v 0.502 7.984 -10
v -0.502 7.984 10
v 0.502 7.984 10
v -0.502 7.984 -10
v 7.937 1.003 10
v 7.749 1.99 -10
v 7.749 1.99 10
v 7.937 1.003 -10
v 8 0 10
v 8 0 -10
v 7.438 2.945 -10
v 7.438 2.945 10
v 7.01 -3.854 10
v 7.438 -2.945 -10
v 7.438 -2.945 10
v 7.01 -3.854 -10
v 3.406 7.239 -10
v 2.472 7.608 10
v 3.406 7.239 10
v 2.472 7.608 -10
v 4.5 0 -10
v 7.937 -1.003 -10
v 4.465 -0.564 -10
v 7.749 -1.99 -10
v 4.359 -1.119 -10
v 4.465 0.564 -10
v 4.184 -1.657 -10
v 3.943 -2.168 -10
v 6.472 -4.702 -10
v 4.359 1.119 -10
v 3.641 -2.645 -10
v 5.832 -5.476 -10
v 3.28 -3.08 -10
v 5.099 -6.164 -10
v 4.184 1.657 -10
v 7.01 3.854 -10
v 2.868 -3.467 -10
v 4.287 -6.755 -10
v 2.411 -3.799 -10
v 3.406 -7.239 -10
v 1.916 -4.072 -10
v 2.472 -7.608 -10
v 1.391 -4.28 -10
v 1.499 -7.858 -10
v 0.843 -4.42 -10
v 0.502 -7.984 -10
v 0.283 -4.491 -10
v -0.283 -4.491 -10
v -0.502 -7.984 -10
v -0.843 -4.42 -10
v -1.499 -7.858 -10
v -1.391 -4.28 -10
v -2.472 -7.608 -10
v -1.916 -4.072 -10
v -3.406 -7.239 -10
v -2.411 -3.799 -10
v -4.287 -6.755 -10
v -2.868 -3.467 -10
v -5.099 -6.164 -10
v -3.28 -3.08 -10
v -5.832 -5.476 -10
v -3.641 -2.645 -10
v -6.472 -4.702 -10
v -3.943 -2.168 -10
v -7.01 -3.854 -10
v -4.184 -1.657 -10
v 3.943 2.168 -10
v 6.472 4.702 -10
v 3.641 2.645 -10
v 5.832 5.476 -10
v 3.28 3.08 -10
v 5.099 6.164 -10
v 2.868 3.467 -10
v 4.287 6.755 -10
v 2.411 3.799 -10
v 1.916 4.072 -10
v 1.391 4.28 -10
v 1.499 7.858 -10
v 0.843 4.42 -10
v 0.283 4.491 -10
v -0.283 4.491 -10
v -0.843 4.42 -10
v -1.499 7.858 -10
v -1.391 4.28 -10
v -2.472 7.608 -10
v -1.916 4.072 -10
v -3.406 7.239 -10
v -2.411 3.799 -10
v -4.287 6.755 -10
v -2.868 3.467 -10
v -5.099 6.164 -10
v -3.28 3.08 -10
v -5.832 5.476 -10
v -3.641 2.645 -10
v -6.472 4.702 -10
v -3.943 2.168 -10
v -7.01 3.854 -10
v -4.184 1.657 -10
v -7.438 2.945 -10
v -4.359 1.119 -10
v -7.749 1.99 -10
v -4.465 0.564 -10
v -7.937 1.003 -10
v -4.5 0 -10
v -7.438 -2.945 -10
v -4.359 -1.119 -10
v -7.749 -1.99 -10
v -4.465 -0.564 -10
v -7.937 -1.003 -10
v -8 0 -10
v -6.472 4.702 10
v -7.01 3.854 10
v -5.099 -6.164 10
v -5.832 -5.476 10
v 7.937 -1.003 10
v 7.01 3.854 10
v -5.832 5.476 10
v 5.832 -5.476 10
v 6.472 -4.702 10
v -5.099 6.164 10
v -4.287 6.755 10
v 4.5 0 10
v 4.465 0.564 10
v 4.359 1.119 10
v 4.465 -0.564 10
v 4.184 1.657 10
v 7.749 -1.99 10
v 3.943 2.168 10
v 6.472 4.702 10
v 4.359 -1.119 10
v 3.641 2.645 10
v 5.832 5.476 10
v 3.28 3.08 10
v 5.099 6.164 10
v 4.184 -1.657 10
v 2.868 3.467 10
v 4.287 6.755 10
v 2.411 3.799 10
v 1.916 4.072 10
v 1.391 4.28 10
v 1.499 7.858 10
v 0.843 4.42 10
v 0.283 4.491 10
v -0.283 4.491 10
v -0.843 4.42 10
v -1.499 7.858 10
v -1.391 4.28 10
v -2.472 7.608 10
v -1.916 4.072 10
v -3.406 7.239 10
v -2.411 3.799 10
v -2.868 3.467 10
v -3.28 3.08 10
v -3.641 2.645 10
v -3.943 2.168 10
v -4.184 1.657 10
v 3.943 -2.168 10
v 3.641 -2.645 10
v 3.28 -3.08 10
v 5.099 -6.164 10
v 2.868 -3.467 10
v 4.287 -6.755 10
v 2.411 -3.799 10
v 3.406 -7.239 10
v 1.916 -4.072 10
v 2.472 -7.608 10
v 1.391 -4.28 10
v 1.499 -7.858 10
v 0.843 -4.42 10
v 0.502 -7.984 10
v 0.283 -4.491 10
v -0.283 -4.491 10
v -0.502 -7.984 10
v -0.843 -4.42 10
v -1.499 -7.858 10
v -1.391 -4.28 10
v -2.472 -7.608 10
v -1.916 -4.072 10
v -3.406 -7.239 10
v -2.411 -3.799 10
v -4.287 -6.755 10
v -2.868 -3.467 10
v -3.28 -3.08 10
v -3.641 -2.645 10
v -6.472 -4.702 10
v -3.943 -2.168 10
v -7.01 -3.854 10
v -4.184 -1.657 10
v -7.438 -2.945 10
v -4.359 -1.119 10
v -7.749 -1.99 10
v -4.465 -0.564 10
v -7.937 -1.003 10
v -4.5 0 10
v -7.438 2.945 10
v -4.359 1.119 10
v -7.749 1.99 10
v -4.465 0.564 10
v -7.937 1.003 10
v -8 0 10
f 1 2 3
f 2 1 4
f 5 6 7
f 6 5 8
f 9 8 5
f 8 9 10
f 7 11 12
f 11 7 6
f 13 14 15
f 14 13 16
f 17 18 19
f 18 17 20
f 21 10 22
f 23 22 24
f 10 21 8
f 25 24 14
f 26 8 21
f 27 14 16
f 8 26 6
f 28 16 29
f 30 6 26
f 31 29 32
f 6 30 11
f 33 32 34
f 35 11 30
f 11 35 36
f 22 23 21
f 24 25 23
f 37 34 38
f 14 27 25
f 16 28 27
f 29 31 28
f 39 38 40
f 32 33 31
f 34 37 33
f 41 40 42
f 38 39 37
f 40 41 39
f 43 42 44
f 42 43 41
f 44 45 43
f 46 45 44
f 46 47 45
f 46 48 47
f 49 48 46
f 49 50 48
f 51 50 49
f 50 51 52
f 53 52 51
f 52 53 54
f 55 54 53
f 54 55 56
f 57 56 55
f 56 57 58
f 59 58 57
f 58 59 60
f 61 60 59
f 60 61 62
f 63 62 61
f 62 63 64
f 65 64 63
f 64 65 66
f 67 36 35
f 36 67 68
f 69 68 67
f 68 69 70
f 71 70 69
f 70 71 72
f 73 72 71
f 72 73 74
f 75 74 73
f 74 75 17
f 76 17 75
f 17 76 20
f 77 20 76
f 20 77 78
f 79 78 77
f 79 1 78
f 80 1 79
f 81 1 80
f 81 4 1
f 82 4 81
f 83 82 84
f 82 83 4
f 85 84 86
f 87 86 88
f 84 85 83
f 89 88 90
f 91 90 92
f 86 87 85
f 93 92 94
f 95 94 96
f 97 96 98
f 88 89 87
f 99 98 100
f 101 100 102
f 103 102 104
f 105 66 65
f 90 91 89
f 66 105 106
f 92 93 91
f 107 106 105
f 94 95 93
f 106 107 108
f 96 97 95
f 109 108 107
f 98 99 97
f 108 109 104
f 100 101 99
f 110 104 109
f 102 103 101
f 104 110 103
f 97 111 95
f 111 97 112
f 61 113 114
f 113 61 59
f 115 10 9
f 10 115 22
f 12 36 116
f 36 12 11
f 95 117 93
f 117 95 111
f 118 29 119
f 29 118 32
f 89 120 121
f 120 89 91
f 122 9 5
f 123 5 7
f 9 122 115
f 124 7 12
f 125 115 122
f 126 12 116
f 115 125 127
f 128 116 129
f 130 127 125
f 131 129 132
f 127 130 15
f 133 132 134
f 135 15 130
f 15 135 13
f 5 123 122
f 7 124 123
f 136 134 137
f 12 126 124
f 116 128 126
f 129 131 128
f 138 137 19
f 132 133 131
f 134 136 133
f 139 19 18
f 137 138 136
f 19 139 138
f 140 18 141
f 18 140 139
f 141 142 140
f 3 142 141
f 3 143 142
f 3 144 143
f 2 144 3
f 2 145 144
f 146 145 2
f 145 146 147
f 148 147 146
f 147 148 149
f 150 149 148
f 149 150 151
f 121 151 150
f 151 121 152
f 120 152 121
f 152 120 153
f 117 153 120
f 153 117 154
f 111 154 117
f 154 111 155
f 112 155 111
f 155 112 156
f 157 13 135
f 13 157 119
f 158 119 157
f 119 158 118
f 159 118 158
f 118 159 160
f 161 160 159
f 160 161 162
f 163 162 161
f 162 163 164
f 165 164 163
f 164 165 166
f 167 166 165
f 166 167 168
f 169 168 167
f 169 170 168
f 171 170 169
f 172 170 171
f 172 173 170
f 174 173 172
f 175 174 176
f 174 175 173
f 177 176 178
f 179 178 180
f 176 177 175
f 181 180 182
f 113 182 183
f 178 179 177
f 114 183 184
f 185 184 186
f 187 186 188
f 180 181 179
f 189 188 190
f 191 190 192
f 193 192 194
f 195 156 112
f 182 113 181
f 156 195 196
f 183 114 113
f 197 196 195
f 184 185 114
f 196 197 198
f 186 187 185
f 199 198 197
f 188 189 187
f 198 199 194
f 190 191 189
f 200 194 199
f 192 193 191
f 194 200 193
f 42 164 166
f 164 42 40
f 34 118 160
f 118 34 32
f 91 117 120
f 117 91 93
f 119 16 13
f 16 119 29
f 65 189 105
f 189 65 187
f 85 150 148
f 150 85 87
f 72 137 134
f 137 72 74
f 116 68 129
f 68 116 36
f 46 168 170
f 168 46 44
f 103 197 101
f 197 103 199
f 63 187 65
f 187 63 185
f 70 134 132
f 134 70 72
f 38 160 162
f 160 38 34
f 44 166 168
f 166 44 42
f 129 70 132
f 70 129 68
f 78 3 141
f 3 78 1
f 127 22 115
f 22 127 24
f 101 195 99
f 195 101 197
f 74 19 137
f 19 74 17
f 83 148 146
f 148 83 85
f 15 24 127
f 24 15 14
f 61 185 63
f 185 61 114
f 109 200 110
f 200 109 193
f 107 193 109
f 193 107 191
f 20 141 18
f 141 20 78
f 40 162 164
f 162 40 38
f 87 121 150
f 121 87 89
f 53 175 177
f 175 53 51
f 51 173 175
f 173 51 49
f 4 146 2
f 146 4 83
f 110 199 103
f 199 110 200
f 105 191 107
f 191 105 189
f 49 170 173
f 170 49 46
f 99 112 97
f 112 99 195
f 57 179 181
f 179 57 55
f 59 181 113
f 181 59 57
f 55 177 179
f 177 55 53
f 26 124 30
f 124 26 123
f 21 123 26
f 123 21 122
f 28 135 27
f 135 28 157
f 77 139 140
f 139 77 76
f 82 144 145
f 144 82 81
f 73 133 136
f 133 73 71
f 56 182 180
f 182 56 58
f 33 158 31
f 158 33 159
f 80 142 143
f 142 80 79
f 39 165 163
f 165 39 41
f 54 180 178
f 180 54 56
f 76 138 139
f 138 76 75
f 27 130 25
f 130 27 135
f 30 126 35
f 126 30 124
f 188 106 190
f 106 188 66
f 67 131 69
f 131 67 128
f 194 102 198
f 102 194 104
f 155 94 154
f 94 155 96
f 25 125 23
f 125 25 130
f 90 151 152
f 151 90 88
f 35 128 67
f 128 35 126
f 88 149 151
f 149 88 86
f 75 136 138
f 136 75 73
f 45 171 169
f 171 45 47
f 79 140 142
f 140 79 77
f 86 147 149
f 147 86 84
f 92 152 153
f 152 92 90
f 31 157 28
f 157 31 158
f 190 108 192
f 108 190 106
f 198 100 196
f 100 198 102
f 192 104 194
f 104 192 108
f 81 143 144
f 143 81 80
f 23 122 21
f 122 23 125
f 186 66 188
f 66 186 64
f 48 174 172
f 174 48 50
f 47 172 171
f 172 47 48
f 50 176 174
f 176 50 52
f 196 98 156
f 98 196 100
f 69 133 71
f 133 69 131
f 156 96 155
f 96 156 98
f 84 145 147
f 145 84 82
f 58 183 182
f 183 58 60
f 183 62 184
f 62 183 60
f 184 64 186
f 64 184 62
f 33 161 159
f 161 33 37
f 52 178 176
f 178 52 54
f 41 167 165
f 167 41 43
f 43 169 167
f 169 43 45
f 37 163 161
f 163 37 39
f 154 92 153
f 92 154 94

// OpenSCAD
$fn = 50;


difference() {
	union() {
		translate(v = [0, 0, -10.0000000000]) {
			cylinder(h = 20, r = 8.0000000000);
		}
	}
	union() {
		translate(v = [0, 0, -100.0000000000]) {
			cylinder(h = 200, r = 4.5000000000);
		}
	}
}
